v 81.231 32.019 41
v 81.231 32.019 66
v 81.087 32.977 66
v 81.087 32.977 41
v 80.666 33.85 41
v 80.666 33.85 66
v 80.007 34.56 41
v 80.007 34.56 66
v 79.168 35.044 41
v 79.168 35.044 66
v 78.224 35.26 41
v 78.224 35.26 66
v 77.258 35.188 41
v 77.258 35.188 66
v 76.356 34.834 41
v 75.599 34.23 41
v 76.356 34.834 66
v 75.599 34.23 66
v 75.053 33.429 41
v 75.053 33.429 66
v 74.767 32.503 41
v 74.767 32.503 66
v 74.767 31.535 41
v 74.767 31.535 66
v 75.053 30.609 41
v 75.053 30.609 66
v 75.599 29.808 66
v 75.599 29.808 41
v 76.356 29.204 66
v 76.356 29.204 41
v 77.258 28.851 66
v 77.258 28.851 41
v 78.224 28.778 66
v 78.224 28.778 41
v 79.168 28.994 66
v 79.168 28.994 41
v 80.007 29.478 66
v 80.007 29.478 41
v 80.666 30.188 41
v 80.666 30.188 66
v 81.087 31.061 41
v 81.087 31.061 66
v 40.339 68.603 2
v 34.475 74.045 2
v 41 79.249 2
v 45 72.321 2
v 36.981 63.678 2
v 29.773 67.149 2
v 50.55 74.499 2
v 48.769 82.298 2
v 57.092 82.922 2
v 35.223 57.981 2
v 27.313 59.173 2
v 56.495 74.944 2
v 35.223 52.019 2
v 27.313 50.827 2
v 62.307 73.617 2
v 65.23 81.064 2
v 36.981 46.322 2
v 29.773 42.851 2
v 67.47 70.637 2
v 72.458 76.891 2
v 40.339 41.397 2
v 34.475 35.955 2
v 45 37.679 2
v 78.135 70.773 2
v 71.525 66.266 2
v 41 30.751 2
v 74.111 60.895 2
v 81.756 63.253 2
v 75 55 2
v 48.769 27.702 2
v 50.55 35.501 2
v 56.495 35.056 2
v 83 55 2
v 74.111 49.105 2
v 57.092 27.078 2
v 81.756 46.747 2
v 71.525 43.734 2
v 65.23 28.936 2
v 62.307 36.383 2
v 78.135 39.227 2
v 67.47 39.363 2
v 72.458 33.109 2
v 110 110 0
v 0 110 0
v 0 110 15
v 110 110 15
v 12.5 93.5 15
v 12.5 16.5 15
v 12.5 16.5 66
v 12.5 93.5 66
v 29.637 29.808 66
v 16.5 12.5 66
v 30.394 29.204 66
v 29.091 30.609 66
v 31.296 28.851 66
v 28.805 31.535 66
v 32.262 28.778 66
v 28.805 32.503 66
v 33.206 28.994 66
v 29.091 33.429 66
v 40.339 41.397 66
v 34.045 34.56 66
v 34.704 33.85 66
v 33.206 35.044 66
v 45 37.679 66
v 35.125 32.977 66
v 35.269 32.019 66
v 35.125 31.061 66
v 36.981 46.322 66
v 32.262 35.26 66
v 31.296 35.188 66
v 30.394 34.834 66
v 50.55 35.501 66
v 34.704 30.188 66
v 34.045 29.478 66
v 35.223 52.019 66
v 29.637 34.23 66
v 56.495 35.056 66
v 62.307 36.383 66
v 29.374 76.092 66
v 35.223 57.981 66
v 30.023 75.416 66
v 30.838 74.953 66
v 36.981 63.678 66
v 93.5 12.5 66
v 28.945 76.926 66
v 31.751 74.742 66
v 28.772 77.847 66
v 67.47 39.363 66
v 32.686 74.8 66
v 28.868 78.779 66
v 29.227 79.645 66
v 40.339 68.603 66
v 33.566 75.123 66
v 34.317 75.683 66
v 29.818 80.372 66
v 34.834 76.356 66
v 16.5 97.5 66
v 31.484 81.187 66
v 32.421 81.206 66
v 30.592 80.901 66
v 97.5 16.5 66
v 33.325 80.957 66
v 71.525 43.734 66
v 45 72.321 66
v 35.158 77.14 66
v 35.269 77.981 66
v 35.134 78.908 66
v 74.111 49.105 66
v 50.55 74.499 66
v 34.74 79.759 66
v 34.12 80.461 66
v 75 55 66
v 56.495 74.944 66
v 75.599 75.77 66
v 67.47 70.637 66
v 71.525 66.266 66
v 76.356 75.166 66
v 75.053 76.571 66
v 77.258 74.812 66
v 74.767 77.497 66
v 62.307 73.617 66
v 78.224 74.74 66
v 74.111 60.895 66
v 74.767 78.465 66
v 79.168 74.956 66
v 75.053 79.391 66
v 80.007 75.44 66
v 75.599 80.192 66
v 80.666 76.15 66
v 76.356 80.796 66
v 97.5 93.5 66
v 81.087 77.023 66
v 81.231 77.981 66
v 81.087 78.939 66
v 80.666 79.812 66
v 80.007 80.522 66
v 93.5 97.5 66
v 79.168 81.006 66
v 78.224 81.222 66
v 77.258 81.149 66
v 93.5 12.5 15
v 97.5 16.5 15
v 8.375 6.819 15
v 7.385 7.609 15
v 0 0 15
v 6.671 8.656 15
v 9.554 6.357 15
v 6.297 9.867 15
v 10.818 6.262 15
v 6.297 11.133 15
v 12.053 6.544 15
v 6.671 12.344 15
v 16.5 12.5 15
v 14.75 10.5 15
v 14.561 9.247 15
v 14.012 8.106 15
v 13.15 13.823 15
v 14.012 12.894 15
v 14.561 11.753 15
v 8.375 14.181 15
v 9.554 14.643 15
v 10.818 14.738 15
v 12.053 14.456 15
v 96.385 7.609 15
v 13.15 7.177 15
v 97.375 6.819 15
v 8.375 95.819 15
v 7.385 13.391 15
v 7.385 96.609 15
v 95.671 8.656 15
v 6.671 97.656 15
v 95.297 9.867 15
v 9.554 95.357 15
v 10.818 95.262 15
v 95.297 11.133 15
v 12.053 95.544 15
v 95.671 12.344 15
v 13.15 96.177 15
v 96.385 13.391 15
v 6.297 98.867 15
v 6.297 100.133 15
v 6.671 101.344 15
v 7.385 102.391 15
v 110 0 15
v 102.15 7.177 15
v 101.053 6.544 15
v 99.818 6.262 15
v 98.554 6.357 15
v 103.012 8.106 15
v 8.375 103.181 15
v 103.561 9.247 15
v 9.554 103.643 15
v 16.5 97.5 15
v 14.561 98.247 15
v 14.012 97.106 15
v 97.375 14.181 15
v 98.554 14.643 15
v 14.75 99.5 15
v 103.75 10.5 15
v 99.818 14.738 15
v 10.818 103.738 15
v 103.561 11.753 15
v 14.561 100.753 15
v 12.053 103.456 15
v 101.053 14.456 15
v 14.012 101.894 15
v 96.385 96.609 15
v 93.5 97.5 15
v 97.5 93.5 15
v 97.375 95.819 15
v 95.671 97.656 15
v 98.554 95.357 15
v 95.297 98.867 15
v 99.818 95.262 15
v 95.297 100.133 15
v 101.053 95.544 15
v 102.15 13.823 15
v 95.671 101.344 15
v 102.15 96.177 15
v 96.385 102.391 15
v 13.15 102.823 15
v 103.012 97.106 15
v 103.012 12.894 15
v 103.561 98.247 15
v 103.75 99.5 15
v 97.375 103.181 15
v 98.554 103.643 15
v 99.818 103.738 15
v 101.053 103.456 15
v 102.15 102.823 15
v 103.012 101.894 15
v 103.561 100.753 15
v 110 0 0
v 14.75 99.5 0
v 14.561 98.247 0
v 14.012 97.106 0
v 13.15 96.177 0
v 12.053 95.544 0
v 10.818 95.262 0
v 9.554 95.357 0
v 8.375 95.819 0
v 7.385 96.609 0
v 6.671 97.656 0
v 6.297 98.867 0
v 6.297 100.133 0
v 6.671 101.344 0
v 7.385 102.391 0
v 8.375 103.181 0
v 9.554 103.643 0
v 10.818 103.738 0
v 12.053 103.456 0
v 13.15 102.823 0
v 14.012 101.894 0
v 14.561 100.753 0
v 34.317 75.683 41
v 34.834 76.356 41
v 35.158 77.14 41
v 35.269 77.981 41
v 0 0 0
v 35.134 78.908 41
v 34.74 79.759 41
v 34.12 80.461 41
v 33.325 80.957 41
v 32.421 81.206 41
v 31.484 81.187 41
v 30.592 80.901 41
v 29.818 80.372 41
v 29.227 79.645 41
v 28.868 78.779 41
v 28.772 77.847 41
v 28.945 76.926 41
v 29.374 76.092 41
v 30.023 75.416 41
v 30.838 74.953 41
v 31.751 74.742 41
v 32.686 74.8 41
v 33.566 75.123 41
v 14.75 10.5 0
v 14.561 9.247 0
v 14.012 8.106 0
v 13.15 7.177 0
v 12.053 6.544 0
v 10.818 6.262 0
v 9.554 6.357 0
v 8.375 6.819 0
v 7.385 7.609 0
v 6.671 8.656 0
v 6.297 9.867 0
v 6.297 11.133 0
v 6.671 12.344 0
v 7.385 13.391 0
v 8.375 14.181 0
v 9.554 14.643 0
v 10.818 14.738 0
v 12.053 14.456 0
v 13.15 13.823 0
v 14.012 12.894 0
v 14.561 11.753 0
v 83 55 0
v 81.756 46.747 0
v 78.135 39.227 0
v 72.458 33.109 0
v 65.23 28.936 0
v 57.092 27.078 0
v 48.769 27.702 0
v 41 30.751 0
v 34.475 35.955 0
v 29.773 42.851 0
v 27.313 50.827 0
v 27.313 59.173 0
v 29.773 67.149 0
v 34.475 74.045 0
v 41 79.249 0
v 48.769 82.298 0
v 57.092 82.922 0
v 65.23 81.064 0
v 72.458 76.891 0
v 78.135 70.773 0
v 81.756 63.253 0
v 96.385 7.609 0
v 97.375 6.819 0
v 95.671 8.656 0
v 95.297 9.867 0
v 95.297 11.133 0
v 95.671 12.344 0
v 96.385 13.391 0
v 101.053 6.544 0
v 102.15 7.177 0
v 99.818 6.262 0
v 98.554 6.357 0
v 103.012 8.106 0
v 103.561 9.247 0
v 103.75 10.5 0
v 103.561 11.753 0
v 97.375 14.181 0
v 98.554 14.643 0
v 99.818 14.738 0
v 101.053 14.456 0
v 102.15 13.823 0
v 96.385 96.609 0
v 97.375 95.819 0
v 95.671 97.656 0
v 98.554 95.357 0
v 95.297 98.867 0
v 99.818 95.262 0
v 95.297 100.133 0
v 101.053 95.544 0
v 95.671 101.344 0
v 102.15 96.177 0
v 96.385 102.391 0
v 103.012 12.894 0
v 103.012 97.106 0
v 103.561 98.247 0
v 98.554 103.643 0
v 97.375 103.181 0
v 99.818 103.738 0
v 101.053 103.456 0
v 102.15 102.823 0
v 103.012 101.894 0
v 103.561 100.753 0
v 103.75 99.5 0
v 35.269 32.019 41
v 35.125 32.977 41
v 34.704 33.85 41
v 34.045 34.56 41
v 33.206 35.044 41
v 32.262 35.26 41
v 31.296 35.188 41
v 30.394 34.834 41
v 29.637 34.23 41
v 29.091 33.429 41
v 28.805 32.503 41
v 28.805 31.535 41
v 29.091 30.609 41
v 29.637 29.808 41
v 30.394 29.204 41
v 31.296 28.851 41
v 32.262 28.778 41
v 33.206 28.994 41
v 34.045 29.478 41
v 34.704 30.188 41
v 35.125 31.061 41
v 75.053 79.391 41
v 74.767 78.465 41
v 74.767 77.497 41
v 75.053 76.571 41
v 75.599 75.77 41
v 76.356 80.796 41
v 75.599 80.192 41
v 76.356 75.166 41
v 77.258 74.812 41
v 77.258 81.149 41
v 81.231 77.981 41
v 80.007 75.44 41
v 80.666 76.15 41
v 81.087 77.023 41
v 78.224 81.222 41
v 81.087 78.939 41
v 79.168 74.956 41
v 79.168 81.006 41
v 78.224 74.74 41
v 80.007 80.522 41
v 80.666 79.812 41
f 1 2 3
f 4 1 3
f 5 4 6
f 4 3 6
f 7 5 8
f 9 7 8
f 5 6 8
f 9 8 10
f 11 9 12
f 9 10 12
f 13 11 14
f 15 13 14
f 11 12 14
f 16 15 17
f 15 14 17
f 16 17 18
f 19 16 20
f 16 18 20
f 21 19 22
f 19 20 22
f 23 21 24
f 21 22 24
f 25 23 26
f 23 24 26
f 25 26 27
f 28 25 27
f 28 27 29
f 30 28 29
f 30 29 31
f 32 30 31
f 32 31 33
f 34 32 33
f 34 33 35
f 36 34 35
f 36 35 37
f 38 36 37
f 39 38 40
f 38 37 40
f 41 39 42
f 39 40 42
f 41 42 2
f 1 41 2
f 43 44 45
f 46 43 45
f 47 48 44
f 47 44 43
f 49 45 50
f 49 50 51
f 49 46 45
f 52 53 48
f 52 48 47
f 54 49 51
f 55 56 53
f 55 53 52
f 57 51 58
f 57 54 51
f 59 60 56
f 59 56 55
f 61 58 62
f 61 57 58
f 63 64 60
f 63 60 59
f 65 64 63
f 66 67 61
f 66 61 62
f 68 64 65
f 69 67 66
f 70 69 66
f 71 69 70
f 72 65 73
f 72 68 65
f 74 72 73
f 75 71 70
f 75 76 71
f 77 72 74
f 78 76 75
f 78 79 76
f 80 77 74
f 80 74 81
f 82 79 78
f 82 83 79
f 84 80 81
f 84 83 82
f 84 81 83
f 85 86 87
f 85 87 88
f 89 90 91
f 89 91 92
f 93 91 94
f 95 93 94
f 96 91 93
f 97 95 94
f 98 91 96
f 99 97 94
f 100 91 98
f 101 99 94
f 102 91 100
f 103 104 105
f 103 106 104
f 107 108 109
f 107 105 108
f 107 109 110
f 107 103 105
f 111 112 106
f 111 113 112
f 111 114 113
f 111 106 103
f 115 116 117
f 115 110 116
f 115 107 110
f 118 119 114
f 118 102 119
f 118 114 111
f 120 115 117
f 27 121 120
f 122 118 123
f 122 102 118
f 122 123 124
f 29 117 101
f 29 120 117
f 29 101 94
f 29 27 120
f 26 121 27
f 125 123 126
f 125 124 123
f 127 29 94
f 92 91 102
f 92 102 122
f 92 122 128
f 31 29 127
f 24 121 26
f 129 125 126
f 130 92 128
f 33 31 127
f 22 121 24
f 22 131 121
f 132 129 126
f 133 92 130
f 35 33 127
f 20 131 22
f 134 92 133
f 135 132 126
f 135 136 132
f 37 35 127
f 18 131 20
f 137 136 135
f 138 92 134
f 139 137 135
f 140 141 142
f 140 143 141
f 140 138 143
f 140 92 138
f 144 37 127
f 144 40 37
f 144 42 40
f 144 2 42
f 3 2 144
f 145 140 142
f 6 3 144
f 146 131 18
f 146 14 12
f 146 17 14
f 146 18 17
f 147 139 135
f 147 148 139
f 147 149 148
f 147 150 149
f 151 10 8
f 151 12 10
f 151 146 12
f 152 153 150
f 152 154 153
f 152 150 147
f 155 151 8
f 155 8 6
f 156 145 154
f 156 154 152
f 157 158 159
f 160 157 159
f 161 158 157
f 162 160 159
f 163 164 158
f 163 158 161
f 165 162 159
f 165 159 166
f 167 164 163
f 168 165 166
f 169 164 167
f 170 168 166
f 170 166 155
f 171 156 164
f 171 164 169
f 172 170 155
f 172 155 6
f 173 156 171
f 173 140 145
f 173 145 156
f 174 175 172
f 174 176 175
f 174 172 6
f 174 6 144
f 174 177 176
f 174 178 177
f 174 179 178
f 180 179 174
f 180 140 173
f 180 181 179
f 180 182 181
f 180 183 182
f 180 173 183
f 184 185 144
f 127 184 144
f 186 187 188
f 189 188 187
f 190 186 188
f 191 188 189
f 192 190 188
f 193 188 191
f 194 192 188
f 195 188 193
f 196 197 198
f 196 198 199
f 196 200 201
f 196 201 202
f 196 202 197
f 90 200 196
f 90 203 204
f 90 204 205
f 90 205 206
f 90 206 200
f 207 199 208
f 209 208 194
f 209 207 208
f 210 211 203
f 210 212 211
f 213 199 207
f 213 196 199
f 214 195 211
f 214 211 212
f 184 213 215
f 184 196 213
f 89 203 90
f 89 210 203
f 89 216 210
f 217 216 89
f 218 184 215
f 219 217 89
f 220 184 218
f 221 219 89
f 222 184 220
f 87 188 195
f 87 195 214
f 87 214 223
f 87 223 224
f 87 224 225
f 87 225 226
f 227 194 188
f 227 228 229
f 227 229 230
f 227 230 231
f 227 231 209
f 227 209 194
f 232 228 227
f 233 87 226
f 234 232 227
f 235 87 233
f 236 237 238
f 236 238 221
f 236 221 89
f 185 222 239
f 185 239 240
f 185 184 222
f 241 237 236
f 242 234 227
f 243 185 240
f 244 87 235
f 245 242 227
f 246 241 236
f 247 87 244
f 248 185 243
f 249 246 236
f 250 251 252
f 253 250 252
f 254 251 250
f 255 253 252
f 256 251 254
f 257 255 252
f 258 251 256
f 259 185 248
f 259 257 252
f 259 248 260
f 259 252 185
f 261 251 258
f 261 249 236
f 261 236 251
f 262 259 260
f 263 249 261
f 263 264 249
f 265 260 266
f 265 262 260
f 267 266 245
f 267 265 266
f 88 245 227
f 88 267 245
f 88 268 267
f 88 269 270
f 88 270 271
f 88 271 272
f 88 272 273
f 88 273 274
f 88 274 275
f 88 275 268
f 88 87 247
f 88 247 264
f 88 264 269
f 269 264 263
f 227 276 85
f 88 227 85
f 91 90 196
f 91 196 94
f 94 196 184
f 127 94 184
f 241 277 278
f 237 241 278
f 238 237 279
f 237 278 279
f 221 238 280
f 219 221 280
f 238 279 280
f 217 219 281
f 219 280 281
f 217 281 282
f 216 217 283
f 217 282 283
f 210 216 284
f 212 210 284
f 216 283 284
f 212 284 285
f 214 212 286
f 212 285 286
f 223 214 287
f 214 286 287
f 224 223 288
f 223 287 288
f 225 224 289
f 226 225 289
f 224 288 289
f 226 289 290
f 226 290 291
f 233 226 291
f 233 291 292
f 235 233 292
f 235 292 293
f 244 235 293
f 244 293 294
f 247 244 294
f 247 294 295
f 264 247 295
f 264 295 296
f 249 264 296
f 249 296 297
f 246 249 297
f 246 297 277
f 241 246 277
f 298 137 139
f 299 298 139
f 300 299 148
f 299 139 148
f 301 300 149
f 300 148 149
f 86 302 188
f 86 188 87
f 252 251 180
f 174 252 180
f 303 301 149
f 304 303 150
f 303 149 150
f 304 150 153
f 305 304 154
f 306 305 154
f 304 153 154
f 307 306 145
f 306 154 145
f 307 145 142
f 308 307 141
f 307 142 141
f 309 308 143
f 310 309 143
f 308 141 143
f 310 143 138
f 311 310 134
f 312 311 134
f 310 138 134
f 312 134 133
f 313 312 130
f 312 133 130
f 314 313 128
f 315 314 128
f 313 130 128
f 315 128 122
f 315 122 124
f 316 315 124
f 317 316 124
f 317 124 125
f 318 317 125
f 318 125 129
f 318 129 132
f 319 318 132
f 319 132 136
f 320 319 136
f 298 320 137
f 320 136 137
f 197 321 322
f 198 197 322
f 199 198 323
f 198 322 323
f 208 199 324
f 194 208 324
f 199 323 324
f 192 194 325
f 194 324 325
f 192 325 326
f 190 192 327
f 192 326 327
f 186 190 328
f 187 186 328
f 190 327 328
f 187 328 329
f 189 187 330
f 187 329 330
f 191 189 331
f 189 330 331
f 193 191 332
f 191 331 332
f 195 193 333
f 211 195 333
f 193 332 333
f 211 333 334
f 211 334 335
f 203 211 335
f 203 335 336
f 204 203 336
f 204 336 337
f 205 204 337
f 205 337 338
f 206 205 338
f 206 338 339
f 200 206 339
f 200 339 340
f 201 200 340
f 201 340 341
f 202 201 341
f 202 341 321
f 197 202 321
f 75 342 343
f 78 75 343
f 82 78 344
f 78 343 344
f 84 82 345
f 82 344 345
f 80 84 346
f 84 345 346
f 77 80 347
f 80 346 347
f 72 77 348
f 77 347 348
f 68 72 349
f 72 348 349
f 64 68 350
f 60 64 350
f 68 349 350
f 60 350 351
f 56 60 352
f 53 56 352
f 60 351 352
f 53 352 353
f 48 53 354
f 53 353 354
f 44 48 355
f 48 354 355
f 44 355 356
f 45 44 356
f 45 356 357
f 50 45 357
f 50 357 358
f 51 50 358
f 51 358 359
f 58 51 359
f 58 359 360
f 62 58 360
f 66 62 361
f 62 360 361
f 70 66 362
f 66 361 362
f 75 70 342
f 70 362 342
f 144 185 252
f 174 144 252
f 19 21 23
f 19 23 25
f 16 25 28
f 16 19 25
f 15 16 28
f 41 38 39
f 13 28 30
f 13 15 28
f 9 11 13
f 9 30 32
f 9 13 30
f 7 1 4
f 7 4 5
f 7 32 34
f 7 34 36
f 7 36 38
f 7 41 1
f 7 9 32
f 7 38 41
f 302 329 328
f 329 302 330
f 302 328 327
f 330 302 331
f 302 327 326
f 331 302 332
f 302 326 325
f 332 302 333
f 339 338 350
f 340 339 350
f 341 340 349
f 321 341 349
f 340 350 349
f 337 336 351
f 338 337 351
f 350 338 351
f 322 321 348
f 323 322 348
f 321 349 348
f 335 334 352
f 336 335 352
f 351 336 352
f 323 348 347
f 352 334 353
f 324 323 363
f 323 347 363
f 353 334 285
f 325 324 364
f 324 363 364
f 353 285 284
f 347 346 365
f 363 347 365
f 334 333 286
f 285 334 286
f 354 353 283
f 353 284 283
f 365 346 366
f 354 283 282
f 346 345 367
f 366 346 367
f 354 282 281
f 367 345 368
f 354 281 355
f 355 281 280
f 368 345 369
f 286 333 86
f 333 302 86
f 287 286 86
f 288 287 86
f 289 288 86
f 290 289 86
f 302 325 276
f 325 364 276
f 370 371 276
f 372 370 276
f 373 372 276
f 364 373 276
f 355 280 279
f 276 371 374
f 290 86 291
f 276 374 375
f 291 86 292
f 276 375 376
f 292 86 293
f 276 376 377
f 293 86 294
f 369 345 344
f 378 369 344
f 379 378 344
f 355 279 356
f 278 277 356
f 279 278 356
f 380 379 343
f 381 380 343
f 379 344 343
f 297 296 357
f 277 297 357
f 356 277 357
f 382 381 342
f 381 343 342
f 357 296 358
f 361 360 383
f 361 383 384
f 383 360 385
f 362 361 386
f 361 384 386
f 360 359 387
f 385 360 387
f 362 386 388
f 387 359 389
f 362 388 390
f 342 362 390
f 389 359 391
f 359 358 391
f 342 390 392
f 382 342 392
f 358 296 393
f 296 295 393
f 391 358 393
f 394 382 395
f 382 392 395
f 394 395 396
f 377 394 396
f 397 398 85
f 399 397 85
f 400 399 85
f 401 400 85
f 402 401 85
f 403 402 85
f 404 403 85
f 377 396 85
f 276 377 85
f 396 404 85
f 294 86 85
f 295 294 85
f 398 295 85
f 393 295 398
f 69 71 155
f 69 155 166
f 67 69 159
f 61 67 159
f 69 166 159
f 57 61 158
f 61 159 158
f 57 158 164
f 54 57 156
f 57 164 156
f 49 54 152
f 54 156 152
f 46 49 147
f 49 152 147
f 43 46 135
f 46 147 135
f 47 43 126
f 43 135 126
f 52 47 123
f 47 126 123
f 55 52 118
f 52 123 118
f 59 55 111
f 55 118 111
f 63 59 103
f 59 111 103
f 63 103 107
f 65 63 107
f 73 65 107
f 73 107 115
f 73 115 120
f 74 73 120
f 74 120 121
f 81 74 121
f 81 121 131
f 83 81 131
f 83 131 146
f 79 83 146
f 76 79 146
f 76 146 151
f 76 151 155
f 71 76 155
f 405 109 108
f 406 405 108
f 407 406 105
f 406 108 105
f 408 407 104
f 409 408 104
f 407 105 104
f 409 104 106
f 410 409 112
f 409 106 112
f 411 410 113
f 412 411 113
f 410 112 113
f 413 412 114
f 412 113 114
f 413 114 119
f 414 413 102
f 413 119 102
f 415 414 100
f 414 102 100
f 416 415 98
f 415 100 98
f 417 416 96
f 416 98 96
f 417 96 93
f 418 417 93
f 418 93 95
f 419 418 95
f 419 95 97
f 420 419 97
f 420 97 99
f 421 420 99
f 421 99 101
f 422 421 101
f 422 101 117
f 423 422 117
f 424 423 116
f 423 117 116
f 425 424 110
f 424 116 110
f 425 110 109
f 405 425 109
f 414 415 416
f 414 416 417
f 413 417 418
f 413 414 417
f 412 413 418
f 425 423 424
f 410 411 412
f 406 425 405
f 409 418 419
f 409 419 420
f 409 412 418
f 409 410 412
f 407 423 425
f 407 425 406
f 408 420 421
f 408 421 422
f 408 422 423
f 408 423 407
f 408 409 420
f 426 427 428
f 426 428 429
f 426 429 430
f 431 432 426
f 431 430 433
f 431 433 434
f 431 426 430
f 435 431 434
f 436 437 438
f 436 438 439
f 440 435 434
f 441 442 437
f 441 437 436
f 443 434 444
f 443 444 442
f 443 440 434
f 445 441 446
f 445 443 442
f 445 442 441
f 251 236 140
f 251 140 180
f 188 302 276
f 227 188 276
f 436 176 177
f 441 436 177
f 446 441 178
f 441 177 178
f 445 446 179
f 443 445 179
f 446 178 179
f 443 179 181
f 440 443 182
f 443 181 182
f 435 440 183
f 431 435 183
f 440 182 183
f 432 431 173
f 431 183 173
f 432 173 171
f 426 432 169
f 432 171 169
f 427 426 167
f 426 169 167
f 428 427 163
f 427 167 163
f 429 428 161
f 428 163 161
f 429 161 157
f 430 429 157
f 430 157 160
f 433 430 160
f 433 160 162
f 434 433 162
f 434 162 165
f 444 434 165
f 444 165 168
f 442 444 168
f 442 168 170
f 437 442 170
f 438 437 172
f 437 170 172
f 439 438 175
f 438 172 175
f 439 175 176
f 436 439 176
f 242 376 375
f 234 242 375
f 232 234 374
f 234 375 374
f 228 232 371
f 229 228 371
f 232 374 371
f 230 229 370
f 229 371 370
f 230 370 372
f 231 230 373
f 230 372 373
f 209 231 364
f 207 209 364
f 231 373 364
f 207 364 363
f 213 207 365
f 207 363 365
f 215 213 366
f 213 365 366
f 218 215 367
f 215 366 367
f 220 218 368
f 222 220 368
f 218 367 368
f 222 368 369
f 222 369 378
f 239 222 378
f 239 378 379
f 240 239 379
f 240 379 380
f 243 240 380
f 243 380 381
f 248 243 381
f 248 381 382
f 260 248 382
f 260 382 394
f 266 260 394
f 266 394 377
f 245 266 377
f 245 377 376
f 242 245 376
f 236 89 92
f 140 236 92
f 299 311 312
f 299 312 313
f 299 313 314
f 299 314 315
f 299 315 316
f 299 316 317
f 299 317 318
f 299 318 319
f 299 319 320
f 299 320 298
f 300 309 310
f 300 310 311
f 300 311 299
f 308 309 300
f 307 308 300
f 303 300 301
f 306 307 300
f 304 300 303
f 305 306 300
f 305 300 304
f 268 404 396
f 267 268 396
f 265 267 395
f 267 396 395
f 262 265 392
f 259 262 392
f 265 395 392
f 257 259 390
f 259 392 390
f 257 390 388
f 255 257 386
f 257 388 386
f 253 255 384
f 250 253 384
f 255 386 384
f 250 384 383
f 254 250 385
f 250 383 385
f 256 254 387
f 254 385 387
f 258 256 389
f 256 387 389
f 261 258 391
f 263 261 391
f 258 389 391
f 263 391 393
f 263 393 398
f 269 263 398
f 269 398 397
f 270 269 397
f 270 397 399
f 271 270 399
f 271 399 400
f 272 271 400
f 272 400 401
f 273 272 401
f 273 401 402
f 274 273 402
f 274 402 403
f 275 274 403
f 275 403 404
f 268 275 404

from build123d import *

# Parameters (mm, degrees)
F0_W      = 110
F0_H      = 110
F1_DEPTH  = 15
F2_W      = 85
F2_H      = 85
F3_DEPTH  = 51
F4_SIZE   = 4
F5_R      = 20
F6_DEPTH  = 66.001
F7_R      = 4.25
F8_DEPTH  = 66.001
F9_R      = 28
F10_DEPTH = 2
F11_R     = 3.25
F12_DEPTH = 25


with BuildPart() as f1:
    # F0 (on Top) → F1 (new body)
    with BuildSketch(Plane.XY):
        with Locations((55, 55)):
            Rectangle(F0_W, F0_H)
    extrude(amount=F1_DEPTH)

    # F2 (on face) → F3 (join)
    with BuildSketch(Plane.XY.offset(15)):
        with Locations((55, 55)):
            Rectangle(F2_W, F2_H)
    extrude(amount=F3_DEPTH)

    # F4
    f4_edges = [f1.edges().sort_by_distance(p)[0] for p in [
        (12.5, 12.5, 40.5),
        (97.5, 12.5, 40.5),
        (97.5, 97.5, 40.5),
        (12.5, 97.5, 40.5),
    ]]
    chamfer(f4_edges, length=F4_SIZE)

    # F5 (on face) → F6 (cut, through all)
    with BuildSketch(Plane.XY.offset(66)):
        with Locations((55, 55)):
            Circle(F5_R)
    extrude(amount=-F6_DEPTH, mode=Mode.SUBTRACT)

    # F7 (on face) → F8 (cut, through all)
    with BuildSketch(Plane(origin=(0, 0, 0), x_dir=(1, 0, 0), z_dir=(0, 0, -1))):
        with Locations((10.5, -10.5)):
            Circle(F7_R)
        with Locations((99.5, -10.5)):
            Circle(F7_R)
        with Locations((99.5, -99.5)):
            Circle(F7_R)
        with Locations((10.5, -99.5)):
            Circle(F7_R)
    extrude(amount=-F8_DEPTH, mode=Mode.SUBTRACT)

    # F9 (on face) → F10 (cut)
    with BuildSketch(Plane(origin=(0, 0, 0), x_dir=(1, 0, 0), z_dir=(0, 0, -1))):
        with Locations((55, -55)):
            Circle(F9_R)
    extrude(amount=-F10_DEPTH, mode=Mode.SUBTRACT)

    # F11 (on face) → F12 (cut)
    with BuildSketch(Plane.XY.offset(66)):
        with BuildLine():
            ThreePointArc((34.317127, 75.682873), (35.021638, 76.737249), (35.26903, 77.98097))
            ThreePointArc((35.26903, 77.98097), (29.016421, 79.224692), (34.317127, 75.682873))
        make_face()
        with Locations((77.98097, 77.98097)):
            Circle(F11_R)
        with Locations((77.98097, 32.01903)):
            Circle(F11_R)
        with Locations((32.01903, 32.01903)):
            Circle(F11_R)
    extrude(amount=-F12_DEPTH, mode=Mode.SUBTRACT)


solid = f1.part
